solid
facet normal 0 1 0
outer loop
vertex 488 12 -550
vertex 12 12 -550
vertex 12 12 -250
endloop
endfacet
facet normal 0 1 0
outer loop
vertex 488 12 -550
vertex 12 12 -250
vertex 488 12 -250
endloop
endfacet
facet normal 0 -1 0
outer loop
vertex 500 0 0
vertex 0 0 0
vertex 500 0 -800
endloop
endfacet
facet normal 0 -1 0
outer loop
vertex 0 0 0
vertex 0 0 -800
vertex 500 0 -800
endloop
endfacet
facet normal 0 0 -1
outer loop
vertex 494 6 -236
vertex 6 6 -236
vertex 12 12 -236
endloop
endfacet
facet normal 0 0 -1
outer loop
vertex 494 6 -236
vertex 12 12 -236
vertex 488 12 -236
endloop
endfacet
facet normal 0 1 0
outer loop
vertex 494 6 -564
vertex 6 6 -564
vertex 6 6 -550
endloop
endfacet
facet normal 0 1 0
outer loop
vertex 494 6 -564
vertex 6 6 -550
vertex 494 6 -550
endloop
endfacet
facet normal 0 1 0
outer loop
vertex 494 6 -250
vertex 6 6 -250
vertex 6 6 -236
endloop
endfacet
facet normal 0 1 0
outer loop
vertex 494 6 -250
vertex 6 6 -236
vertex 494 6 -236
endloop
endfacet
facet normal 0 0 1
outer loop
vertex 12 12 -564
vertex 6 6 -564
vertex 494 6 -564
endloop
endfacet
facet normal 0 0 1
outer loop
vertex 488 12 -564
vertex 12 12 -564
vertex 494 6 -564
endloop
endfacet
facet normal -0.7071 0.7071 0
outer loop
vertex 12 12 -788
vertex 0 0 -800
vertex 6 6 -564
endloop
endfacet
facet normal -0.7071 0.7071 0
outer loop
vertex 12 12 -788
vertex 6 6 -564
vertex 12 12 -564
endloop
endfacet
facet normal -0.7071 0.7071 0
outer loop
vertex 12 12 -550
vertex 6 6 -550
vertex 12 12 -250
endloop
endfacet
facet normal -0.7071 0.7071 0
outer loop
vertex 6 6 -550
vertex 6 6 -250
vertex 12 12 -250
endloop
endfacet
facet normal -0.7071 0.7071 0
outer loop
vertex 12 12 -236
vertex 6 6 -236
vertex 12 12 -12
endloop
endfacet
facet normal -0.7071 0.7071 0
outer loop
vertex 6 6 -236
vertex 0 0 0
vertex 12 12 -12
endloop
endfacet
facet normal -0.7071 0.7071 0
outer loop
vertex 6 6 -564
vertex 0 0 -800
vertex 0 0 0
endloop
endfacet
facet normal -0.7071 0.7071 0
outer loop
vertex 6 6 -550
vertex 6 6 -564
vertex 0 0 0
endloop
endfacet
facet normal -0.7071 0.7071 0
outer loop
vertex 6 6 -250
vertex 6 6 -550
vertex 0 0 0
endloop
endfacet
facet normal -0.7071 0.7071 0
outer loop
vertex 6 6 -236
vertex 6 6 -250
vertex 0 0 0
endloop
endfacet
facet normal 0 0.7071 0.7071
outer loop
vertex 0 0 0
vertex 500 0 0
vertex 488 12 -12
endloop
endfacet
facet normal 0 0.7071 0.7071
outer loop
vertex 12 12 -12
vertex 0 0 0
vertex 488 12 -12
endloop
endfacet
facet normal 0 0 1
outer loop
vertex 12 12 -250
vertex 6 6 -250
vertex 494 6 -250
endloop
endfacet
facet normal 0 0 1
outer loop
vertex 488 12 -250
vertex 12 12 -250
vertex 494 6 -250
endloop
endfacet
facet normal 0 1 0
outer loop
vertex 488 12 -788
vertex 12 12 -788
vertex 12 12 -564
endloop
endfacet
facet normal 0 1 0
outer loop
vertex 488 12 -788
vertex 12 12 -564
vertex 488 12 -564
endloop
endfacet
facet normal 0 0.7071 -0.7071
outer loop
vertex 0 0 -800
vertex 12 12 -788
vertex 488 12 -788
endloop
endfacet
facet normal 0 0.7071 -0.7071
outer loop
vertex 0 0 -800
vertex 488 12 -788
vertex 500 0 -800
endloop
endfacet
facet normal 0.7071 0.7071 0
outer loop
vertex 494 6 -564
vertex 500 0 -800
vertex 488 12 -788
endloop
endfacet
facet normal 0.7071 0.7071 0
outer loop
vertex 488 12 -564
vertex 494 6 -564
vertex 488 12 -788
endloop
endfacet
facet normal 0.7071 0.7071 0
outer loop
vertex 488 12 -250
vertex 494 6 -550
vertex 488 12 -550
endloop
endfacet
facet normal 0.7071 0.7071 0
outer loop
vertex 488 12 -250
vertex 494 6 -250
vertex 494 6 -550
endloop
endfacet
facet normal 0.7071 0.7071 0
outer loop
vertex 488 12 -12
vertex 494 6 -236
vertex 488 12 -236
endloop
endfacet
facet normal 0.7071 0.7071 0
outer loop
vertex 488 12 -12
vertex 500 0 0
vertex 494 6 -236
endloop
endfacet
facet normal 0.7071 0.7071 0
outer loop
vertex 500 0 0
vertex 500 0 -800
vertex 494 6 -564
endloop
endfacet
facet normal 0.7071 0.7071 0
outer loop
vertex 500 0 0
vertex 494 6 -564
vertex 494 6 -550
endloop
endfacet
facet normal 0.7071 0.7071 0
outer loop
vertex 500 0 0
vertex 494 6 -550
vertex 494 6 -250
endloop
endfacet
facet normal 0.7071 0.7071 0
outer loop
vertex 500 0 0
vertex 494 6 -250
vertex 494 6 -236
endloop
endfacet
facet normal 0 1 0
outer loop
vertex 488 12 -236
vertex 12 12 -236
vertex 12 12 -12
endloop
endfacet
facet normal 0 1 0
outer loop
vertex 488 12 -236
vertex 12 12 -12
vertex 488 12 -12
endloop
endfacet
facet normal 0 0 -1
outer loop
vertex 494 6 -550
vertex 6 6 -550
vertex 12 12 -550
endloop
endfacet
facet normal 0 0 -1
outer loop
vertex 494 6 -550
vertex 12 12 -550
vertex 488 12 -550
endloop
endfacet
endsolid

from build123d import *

# Parameters (mm, degrees)
SKETCH5_W             = 500
SKETCH5_H             = 300
BOSS_EXTRUDE1_DEPTH   = 12
SKETCH5_H_2           = 224
BOSS_EXTRUDE1_2_DEPTH = 12
BOSS_EXTRUDE1_3_DEPTH = 12
SKETCH5_3_W           = 500
SKETCH5_3_H           = 14
BOSS_EXTRUDE2_DEPTH   = 6
SKETCH5_4_W           = 500
SKETCH5_4_H           = 12
BOSS_EXTRUDE3_DEPTH   = 12
CHAMFER1_SIZE         = 12


with BuildPart() as part:
    # Sketch5 → Boss-Extrude1 (new body)
    with BuildSketch(Plane(origin=(0, 0, 0), x_dir=(1, 0, 0), z_dir=(0, 1, 0))):
        with Locations((250, 400)):
            Rectangle(SKETCH5_W, SKETCH5_H)
    extrude(amount=BOSS_EXTRUDE1_DEPTH)



with BuildPart() as body_2:
    # Sketch5 → Boss-Extrude1 2 (new body)
    with BuildSketch(Plane(origin=(0, 0, 0), x_dir=(1, 0, 0), z_dir=(0, 1, 0))):
        with Locations((250, 124)):
            Rectangle(SKETCH5_W, SKETCH5_H_2)
    extrude(amount=BOSS_EXTRUDE1_2_DEPTH)


with BuildPart() as body_3:
    # Sketch5 → Boss-Extrude1 3 (new body)
    with BuildSketch(Plane(origin=(0, 0, 0), x_dir=(1, 0, 0), z_dir=(0, 1, 0))):
        with Locations((250, 676)):
            Rectangle(SKETCH5_W, SKETCH5_H_2)
    extrude(amount=BOSS_EXTRUDE1_3_DEPTH)


with BuildPart() as part_1:
    add(part.part)

    add(body_2.part)  # Boss-Extrude2 merges body 2

    add(body_3.part)  # Boss-Extrude2 merges body 3
    # Sketch5<3> → Boss-Extrude2 (add)
    with BuildSketch(Plane(origin=(0, 0, 0), x_dir=(1, 0, 0), z_dir=(0, 1, 0))):
        with Locations((250, 243)):
            Rectangle(SKETCH5_3_W, SKETCH5_3_H)
        with Locations((250, 557)):
            Rectangle(SKETCH5_3_W, SKETCH5_3_H)
    extrude(amount=BOSS_EXTRUDE2_DEPTH)

    # Sketch5<4> → Boss-Extrude3 (add)
    with BuildSketch(Plane(origin=(0, 0, 0), x_dir=(1, 0, 0), z_dir=(0, 1, 0))):
        with Locations((250, 6)):
            Rectangle(SKETCH5_4_W, SKETCH5_4_H)
        with Locations((250, 794)):
            Rectangle(SKETCH5_4_W, SKETCH5_4_H)
    extrude(amount=BOSS_EXTRUDE3_DEPTH)

    # Chamfer1
    # the kernel refuses this chamfer: 12 mm, written as the material it takes off along each edge
    with BuildSketch(Plane(origin=(0, 12, -580.860195856), x_dir=(-0.027495876610586372, -0.9996219169112968, 0), z_dir=(0, 0, 1)), Plane(origin=(500, 12, -219.139804144), x_dir=(0.027495876610586778, -0.9996219169112968, 0), z_dir=(0, 0, -1))) as chamfer1_piece_1:
        Polygon((CHAMFER1_SIZE * 0.999621916911, CHAMFER1_SIZE * 0.0274958766106), (-CHAMFER1_SIZE * 0.0274958766106, CHAMFER1_SIZE * 0.999621916911), (0, 0), align=None)
    extrude(amount=361.720391711, mode=Mode.SUBTRACT)
    with BuildSketch(Plane(origin=(0, 12, 30.860195856), x_dir=(-0.027495876610586372, -0.9996219169112968, 0), z_dir=(0, 0, -1)), Plane(origin=(0, 12, -533.139804144), x_dir=(-0.027495876610586372, -0.9996219169112968, 0), z_dir=(0, 0, -1))) as chamfer1_piece_2:
        Polygon((CHAMFER1_SIZE * 0.999621916911, -CHAMFER1_SIZE * 0.0274958766106), (-CHAMFER1_SIZE * 0.0274958766106, -CHAMFER1_SIZE * 0.999621916911), (0, 0), align=None)
    extrude(amount=297.720391711, mode=Mode.SUBTRACT)
    with BuildSketch(Plane(origin=(500, 12, 30.860195856), x_dir=(0.027495876610586778, -0.9996219169112968, 0), z_dir=(0, 0, -1)), Plane(origin=(500, 12, -533.139804144), x_dir=(0.027495876610586778, -0.9996219169112968, 0), z_dir=(0, 0, -1))) as chamfer1_piece_3:
        Polygon((CHAMFER1_SIZE * 0.999621916911, CHAMFER1_SIZE * 0.0274958766106), (-CHAMFER1_SIZE * 0.0274958766106, CHAMFER1_SIZE * 0.999621916911), (0, 0), align=None)
    extrude(amount=297.720391711, mode=Mode.SUBTRACT)
    with BuildSketch(Plane(origin=(-30.860195856, 12, 0), x_dir=(0, -0.9996219169112968, 0.027495876610586372), z_dir=(1, 0, 0))) as chamfer1_piece_4:
        Polygon((CHAMFER1_SIZE * 0.999621916911, CHAMFER1_SIZE * 0.0274958766106), (-CHAMFER1_SIZE * 0.0274958766106, CHAMFER1_SIZE * 0.999621916911), (0, 0), align=None)
    extrude(amount=561.720391711, mode=Mode.SUBTRACT)
    with BuildSketch(Plane(origin=(530.860195856, 12, -800), x_dir=(0, 0.027495876610586462, 0.9996219169112968), z_dir=(-1, 0, 0))) as chamfer1_piece_5:
        Polygon((CHAMFER1_SIZE * 0.999621916911, -CHAMFER1_SIZE * 0.0274958766106), (-CHAMFER1_SIZE * 0.0274958766106, -CHAMFER1_SIZE * 0.999621916911), (0, 0), align=None)
    extrude(amount=561.720391711, mode=Mode.SUBTRACT)


solid = part_1.part
